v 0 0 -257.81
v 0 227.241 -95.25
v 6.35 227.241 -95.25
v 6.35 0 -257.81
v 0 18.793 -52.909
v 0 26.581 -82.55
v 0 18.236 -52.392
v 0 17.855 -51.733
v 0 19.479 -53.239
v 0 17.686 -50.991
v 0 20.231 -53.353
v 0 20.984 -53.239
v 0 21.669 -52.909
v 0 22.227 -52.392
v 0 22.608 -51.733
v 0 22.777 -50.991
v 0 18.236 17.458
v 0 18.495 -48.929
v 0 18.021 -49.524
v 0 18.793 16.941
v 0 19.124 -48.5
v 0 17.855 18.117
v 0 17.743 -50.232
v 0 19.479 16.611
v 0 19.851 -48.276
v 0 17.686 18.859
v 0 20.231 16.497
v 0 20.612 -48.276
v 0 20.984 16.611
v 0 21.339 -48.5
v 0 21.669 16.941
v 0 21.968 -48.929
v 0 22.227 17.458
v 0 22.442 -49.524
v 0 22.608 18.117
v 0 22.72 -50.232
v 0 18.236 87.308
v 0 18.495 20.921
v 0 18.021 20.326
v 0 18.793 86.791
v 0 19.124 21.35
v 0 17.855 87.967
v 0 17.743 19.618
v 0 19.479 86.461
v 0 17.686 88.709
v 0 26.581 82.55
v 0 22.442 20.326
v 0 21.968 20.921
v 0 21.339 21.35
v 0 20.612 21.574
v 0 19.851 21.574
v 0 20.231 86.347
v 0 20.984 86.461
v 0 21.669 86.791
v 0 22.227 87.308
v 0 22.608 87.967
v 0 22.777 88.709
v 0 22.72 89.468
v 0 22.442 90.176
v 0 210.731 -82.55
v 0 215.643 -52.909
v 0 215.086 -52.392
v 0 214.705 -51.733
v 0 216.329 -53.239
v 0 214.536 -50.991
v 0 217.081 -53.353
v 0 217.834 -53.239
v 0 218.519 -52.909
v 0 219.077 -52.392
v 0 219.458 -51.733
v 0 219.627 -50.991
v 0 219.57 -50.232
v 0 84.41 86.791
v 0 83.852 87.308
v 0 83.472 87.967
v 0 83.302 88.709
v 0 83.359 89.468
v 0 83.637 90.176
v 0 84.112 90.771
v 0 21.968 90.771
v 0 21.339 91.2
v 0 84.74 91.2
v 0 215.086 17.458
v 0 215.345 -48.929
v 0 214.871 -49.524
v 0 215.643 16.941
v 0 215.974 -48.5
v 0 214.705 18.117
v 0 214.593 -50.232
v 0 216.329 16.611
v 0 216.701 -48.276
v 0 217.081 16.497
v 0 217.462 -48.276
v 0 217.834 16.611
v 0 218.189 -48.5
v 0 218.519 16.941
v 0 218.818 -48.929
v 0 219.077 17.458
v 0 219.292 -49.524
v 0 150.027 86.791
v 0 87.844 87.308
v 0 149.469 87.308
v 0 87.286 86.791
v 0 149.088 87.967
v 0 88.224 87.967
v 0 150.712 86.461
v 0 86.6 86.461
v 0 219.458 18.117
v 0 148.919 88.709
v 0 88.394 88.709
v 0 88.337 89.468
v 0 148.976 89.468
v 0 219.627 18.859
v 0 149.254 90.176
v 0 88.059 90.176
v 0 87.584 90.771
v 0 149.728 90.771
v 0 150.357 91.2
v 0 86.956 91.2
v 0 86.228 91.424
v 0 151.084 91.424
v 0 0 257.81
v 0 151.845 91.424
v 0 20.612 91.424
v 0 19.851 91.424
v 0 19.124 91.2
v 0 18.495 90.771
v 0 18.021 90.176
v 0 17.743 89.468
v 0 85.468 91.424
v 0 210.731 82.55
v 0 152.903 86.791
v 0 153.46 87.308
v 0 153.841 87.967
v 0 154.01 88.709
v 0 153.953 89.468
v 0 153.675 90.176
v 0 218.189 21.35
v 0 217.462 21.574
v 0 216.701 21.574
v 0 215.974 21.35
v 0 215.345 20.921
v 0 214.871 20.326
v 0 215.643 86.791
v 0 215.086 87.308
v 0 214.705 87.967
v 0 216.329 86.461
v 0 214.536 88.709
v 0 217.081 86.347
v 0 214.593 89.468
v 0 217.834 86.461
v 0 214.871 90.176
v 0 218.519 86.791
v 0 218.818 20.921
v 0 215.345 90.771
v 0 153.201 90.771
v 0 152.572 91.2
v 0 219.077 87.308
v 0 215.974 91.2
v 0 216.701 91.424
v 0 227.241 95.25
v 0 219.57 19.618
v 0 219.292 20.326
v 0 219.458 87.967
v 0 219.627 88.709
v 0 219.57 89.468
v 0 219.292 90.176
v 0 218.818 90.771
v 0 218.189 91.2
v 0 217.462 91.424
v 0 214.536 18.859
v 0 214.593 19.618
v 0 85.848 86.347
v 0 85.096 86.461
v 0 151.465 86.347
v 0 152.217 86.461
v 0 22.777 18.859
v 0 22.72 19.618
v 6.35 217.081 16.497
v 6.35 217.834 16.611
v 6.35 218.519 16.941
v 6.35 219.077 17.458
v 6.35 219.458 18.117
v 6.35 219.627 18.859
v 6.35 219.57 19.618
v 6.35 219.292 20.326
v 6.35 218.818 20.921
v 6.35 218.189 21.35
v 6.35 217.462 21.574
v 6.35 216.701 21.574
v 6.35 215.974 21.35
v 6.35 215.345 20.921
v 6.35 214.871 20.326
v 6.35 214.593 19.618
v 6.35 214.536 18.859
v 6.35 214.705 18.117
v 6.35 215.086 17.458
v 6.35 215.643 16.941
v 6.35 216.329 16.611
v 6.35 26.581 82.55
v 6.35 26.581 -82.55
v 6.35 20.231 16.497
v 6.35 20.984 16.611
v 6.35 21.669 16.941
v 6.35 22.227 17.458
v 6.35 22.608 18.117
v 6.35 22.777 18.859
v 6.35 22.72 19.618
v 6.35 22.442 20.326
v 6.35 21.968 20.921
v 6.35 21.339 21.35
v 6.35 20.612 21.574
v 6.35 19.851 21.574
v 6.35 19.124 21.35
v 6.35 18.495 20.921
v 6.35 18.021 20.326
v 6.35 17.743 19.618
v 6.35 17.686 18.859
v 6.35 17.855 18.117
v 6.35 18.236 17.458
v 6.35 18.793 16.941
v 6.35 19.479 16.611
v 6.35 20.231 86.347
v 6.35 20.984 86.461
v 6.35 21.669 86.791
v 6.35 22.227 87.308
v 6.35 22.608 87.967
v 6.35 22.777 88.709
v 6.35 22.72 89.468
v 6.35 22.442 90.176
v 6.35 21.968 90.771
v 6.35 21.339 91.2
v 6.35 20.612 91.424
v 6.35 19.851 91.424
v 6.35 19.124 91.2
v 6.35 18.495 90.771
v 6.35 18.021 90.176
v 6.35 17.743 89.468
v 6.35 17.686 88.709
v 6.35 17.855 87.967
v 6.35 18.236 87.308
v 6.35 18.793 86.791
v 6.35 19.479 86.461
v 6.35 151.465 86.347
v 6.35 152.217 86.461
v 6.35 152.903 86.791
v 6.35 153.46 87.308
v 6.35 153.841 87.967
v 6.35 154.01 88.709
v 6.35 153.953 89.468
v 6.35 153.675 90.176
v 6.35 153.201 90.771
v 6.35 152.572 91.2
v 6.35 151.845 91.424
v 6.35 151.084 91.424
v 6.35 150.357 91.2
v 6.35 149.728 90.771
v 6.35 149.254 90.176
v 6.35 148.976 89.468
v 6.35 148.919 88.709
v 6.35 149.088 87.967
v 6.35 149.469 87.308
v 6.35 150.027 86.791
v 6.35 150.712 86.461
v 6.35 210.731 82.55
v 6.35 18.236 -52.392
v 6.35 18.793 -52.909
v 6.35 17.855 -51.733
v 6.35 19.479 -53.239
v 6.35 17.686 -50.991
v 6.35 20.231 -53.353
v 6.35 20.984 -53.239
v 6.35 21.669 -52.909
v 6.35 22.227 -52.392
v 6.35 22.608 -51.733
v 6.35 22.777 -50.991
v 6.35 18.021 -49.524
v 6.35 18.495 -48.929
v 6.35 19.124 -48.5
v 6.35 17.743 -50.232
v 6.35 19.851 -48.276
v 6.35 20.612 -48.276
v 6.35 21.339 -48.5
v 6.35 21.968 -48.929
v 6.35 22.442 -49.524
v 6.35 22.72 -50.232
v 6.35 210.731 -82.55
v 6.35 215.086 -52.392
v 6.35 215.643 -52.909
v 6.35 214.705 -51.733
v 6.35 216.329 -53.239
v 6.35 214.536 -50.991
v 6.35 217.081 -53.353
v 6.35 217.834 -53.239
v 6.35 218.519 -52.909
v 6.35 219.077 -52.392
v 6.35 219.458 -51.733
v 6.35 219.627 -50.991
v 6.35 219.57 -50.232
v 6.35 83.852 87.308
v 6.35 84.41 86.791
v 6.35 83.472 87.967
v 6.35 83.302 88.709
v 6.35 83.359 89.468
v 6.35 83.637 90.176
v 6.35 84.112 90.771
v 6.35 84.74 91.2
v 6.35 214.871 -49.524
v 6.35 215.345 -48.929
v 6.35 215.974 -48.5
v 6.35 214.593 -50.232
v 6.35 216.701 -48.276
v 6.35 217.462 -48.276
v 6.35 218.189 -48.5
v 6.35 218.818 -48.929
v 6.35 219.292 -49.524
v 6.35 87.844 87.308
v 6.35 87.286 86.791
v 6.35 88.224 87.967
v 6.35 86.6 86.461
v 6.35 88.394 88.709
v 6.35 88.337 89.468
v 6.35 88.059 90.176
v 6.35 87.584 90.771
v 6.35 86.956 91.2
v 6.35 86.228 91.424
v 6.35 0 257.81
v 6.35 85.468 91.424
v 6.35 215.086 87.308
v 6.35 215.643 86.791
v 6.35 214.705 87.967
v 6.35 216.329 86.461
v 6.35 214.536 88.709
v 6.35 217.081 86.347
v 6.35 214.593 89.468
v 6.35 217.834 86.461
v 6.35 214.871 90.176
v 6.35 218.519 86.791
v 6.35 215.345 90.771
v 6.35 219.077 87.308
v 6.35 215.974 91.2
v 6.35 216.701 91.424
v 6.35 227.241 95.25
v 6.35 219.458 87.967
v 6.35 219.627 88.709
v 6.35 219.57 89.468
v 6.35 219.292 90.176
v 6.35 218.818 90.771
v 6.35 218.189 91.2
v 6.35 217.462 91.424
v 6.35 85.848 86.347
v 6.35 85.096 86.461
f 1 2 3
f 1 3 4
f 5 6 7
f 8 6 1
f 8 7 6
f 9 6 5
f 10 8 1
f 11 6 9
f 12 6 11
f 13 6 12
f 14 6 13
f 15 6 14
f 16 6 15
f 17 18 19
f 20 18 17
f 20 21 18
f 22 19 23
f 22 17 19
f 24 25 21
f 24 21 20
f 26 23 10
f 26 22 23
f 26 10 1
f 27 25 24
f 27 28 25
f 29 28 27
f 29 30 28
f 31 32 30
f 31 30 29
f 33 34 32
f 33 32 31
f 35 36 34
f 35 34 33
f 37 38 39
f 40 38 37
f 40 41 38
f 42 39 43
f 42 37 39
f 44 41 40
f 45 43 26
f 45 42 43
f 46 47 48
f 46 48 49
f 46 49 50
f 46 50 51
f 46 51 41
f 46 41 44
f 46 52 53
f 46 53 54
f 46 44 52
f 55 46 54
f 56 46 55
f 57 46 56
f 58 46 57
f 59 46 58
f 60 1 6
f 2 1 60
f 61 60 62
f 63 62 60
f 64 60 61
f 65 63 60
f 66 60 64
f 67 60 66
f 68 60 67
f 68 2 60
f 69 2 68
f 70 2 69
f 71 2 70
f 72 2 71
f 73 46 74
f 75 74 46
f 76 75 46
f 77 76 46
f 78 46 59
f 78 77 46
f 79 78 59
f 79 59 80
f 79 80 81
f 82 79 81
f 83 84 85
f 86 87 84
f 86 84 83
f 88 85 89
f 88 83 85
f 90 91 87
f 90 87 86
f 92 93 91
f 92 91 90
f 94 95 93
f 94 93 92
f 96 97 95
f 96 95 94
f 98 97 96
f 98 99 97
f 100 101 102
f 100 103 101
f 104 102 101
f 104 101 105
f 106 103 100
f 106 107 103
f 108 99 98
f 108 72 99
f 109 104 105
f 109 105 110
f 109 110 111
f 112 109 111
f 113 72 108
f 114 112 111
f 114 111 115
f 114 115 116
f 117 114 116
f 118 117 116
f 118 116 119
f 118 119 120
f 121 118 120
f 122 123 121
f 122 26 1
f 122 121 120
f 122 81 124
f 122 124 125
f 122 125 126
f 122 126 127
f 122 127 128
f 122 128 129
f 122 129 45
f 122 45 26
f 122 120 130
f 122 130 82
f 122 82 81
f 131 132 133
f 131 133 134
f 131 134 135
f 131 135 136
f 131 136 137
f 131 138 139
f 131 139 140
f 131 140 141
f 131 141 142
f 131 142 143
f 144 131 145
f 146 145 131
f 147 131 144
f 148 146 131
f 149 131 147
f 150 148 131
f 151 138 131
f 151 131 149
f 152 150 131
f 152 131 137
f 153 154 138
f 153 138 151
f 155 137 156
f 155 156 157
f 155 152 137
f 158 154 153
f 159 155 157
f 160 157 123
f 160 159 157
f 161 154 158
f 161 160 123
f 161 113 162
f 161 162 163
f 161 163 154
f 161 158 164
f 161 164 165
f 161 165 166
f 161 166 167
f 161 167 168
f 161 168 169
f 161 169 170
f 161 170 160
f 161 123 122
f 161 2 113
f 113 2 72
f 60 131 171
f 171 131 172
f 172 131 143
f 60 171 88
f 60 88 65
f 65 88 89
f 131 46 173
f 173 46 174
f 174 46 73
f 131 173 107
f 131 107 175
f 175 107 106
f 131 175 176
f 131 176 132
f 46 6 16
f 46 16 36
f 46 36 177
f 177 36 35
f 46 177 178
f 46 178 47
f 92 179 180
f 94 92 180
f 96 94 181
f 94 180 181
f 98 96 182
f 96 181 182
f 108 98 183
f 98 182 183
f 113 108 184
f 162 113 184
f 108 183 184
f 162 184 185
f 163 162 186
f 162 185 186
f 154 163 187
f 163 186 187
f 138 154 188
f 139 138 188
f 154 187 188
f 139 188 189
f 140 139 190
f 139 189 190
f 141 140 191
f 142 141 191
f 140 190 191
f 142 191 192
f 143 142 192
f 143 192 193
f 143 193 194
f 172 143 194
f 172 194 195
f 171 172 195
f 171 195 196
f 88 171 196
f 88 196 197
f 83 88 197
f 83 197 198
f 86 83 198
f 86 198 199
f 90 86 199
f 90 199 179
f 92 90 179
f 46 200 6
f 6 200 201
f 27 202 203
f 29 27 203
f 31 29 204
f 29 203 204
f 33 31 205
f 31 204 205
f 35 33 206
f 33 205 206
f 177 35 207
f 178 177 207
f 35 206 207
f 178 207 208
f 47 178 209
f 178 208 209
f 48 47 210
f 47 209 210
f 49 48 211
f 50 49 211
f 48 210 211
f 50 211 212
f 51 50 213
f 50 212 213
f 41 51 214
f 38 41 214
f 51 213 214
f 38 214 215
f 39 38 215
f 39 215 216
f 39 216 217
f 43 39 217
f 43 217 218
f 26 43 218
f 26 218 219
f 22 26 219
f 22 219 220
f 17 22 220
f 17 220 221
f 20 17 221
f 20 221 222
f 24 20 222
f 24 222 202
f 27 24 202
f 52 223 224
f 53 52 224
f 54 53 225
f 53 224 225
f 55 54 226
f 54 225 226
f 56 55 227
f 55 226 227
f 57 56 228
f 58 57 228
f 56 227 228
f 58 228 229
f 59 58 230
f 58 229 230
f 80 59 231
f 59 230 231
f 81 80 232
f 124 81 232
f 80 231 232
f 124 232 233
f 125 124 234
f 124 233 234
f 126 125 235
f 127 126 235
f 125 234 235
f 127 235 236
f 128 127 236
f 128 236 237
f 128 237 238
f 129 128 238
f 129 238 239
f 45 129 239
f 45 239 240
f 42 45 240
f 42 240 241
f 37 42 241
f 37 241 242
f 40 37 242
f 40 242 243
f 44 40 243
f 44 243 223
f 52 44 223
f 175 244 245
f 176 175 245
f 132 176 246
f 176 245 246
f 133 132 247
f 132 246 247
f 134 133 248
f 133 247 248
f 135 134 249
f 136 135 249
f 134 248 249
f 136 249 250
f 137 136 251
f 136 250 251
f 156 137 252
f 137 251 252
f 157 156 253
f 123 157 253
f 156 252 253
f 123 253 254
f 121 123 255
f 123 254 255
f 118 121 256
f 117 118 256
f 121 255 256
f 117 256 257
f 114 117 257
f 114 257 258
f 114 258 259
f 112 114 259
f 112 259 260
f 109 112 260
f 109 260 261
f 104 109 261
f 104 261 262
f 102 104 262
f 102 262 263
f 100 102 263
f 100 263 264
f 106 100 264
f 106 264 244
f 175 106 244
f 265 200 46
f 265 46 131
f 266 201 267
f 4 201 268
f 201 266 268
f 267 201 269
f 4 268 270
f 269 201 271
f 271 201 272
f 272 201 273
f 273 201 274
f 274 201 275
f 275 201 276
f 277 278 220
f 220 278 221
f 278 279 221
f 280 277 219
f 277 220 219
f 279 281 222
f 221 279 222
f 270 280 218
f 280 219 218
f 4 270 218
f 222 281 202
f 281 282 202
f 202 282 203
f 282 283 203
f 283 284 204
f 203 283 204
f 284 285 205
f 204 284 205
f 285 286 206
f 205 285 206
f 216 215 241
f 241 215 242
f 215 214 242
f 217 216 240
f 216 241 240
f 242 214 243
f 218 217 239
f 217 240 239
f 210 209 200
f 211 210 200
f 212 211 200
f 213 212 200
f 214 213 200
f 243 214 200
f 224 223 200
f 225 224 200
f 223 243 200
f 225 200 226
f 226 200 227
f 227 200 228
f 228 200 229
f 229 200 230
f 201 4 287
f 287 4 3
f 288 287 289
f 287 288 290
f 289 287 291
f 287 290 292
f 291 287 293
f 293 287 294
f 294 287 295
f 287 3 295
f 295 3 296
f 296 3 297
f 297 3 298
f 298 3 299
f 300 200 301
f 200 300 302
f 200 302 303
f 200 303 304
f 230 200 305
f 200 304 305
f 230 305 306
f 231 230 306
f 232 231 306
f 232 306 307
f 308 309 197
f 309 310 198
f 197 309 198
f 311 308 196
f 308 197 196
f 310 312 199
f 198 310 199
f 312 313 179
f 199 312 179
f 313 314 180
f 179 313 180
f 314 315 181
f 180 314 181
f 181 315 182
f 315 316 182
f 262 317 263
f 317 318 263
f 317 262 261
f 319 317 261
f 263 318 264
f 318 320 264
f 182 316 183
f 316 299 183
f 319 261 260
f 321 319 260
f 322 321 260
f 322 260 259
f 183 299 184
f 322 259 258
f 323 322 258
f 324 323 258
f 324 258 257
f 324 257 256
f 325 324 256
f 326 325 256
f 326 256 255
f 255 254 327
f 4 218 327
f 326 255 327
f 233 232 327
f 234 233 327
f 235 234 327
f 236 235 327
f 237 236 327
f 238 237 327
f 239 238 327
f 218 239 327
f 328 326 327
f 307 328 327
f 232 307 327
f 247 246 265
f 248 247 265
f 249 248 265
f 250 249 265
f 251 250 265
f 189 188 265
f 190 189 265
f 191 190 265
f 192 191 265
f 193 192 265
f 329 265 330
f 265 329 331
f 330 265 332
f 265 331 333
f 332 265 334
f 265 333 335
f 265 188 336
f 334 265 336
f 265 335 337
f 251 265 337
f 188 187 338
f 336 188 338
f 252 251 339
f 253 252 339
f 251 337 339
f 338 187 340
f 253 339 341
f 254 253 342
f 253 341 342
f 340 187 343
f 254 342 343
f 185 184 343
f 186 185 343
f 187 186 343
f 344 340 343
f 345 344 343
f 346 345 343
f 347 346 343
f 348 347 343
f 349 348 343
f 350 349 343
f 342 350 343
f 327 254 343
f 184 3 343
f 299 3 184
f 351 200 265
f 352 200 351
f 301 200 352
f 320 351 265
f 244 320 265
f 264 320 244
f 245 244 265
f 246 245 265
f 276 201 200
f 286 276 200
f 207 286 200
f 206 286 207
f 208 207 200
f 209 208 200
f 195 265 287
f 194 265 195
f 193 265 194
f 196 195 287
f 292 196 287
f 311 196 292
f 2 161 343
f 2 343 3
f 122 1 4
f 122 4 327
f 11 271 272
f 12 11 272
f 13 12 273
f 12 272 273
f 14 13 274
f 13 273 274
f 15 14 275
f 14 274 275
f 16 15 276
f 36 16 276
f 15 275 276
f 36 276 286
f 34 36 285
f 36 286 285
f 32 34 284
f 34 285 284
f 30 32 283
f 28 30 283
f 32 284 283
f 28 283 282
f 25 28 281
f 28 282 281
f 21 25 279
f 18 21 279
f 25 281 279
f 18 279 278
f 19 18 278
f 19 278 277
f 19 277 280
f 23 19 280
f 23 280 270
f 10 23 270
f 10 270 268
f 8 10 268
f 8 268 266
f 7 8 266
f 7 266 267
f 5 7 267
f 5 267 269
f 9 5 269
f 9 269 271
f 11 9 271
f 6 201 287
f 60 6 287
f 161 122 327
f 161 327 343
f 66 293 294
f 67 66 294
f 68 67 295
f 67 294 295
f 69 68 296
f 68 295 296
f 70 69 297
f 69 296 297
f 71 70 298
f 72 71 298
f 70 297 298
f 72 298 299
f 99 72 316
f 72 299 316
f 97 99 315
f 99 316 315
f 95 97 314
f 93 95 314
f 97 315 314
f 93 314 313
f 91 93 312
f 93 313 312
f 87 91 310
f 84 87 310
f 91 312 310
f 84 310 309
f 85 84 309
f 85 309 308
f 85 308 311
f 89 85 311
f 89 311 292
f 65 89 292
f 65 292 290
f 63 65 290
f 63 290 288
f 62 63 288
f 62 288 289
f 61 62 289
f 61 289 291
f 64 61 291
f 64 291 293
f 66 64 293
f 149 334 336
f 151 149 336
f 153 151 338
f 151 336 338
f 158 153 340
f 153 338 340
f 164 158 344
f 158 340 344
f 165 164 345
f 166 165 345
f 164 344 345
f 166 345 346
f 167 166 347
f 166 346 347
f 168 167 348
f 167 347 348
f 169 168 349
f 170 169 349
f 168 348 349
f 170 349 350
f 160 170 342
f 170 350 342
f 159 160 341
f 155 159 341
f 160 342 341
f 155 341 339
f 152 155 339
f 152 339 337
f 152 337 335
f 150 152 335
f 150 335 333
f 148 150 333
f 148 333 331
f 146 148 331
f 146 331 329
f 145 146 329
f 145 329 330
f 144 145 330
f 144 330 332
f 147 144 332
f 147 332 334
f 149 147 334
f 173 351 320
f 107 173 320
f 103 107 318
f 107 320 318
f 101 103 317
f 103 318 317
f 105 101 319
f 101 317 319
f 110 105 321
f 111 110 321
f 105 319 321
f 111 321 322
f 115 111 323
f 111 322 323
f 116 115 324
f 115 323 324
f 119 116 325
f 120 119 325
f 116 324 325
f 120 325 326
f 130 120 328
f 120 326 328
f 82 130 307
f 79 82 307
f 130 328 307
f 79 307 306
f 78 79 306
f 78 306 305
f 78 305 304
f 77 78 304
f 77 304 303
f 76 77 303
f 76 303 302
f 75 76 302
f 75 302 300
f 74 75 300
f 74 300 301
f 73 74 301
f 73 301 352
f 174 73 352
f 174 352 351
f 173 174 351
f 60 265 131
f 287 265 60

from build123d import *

# Parameters (mm, degrees)
BOSS_EXTRUDE1_DEPTH         = 6.35
SKETCH3_W                   = 165.1
SKETCH3_H                   = 184.15
CUT_EXTRUDE1_DEPTH          = 7.35
F_1_4_CLEARANCE_HOLE1_D     = 5.1054
F_1_4_CLEARANCE_HOLE1_DEPTH = 25.4
F_1_4_CLEARANCE_HOLE1_TIP   = 1.533816902


with BuildPart() as part:
    # Sketch1 → Boss-Extrude1 (new body)
    with BuildSketch(Plane(origin=(0, 0, 0), x_dir=(0, 0, -1), z_dir=(1, 0, 0))):
        Polygon((257.81, 0), (-257.81, 0), (-95.25, 227.241295543), (95.25, 227.241295543), align=None)
    extrude(amount=BOSS_EXTRUDE1_DEPTH)

    # Sketch3 → Cut-Extrude1 (cut, through all)
    with BuildSketch(Plane(origin=(6.35, 0, 0), x_dir=(0, 0, -1), z_dir=(1, 0, 0))):
        with Locations((0, 118.656295543)):
            Rectangle(SKETCH3_W, SKETCH3_H)
    extrude(amount=-CUT_EXTRUDE1_DEPTH, mode=Mode.SUBTRACT)

    # 1/4 Clearance Hole1
    with Locations(Plane.ZY):
        with Locations((19.05, 217.081295543), (-50.8, 217.081295543), (-50.8, 151.464628876), (-50.8, 85.84796221), (-50.8, 20.231295543), (19.05, 20.231295543), (88.9, 20.231295543), (88.9, 85.84796221), (88.9, 151.464628876), (88.9, 217.081295543)):
            Hole(F_1_4_CLEARANCE_HOLE1_D / 2, depth=F_1_4_CLEARANCE_HOLE1_DEPTH)
            with Locations((0, 0, -(F_1_4_CLEARANCE_HOLE1_DEPTH + F_1_4_CLEARANCE_HOLE1_TIP / 2))):  # 118° drill point
                Cone(0, F_1_4_CLEARANCE_HOLE1_D / 2, F_1_4_CLEARANCE_HOLE1_TIP, mode=Mode.SUBTRACT)


solid = part.part
